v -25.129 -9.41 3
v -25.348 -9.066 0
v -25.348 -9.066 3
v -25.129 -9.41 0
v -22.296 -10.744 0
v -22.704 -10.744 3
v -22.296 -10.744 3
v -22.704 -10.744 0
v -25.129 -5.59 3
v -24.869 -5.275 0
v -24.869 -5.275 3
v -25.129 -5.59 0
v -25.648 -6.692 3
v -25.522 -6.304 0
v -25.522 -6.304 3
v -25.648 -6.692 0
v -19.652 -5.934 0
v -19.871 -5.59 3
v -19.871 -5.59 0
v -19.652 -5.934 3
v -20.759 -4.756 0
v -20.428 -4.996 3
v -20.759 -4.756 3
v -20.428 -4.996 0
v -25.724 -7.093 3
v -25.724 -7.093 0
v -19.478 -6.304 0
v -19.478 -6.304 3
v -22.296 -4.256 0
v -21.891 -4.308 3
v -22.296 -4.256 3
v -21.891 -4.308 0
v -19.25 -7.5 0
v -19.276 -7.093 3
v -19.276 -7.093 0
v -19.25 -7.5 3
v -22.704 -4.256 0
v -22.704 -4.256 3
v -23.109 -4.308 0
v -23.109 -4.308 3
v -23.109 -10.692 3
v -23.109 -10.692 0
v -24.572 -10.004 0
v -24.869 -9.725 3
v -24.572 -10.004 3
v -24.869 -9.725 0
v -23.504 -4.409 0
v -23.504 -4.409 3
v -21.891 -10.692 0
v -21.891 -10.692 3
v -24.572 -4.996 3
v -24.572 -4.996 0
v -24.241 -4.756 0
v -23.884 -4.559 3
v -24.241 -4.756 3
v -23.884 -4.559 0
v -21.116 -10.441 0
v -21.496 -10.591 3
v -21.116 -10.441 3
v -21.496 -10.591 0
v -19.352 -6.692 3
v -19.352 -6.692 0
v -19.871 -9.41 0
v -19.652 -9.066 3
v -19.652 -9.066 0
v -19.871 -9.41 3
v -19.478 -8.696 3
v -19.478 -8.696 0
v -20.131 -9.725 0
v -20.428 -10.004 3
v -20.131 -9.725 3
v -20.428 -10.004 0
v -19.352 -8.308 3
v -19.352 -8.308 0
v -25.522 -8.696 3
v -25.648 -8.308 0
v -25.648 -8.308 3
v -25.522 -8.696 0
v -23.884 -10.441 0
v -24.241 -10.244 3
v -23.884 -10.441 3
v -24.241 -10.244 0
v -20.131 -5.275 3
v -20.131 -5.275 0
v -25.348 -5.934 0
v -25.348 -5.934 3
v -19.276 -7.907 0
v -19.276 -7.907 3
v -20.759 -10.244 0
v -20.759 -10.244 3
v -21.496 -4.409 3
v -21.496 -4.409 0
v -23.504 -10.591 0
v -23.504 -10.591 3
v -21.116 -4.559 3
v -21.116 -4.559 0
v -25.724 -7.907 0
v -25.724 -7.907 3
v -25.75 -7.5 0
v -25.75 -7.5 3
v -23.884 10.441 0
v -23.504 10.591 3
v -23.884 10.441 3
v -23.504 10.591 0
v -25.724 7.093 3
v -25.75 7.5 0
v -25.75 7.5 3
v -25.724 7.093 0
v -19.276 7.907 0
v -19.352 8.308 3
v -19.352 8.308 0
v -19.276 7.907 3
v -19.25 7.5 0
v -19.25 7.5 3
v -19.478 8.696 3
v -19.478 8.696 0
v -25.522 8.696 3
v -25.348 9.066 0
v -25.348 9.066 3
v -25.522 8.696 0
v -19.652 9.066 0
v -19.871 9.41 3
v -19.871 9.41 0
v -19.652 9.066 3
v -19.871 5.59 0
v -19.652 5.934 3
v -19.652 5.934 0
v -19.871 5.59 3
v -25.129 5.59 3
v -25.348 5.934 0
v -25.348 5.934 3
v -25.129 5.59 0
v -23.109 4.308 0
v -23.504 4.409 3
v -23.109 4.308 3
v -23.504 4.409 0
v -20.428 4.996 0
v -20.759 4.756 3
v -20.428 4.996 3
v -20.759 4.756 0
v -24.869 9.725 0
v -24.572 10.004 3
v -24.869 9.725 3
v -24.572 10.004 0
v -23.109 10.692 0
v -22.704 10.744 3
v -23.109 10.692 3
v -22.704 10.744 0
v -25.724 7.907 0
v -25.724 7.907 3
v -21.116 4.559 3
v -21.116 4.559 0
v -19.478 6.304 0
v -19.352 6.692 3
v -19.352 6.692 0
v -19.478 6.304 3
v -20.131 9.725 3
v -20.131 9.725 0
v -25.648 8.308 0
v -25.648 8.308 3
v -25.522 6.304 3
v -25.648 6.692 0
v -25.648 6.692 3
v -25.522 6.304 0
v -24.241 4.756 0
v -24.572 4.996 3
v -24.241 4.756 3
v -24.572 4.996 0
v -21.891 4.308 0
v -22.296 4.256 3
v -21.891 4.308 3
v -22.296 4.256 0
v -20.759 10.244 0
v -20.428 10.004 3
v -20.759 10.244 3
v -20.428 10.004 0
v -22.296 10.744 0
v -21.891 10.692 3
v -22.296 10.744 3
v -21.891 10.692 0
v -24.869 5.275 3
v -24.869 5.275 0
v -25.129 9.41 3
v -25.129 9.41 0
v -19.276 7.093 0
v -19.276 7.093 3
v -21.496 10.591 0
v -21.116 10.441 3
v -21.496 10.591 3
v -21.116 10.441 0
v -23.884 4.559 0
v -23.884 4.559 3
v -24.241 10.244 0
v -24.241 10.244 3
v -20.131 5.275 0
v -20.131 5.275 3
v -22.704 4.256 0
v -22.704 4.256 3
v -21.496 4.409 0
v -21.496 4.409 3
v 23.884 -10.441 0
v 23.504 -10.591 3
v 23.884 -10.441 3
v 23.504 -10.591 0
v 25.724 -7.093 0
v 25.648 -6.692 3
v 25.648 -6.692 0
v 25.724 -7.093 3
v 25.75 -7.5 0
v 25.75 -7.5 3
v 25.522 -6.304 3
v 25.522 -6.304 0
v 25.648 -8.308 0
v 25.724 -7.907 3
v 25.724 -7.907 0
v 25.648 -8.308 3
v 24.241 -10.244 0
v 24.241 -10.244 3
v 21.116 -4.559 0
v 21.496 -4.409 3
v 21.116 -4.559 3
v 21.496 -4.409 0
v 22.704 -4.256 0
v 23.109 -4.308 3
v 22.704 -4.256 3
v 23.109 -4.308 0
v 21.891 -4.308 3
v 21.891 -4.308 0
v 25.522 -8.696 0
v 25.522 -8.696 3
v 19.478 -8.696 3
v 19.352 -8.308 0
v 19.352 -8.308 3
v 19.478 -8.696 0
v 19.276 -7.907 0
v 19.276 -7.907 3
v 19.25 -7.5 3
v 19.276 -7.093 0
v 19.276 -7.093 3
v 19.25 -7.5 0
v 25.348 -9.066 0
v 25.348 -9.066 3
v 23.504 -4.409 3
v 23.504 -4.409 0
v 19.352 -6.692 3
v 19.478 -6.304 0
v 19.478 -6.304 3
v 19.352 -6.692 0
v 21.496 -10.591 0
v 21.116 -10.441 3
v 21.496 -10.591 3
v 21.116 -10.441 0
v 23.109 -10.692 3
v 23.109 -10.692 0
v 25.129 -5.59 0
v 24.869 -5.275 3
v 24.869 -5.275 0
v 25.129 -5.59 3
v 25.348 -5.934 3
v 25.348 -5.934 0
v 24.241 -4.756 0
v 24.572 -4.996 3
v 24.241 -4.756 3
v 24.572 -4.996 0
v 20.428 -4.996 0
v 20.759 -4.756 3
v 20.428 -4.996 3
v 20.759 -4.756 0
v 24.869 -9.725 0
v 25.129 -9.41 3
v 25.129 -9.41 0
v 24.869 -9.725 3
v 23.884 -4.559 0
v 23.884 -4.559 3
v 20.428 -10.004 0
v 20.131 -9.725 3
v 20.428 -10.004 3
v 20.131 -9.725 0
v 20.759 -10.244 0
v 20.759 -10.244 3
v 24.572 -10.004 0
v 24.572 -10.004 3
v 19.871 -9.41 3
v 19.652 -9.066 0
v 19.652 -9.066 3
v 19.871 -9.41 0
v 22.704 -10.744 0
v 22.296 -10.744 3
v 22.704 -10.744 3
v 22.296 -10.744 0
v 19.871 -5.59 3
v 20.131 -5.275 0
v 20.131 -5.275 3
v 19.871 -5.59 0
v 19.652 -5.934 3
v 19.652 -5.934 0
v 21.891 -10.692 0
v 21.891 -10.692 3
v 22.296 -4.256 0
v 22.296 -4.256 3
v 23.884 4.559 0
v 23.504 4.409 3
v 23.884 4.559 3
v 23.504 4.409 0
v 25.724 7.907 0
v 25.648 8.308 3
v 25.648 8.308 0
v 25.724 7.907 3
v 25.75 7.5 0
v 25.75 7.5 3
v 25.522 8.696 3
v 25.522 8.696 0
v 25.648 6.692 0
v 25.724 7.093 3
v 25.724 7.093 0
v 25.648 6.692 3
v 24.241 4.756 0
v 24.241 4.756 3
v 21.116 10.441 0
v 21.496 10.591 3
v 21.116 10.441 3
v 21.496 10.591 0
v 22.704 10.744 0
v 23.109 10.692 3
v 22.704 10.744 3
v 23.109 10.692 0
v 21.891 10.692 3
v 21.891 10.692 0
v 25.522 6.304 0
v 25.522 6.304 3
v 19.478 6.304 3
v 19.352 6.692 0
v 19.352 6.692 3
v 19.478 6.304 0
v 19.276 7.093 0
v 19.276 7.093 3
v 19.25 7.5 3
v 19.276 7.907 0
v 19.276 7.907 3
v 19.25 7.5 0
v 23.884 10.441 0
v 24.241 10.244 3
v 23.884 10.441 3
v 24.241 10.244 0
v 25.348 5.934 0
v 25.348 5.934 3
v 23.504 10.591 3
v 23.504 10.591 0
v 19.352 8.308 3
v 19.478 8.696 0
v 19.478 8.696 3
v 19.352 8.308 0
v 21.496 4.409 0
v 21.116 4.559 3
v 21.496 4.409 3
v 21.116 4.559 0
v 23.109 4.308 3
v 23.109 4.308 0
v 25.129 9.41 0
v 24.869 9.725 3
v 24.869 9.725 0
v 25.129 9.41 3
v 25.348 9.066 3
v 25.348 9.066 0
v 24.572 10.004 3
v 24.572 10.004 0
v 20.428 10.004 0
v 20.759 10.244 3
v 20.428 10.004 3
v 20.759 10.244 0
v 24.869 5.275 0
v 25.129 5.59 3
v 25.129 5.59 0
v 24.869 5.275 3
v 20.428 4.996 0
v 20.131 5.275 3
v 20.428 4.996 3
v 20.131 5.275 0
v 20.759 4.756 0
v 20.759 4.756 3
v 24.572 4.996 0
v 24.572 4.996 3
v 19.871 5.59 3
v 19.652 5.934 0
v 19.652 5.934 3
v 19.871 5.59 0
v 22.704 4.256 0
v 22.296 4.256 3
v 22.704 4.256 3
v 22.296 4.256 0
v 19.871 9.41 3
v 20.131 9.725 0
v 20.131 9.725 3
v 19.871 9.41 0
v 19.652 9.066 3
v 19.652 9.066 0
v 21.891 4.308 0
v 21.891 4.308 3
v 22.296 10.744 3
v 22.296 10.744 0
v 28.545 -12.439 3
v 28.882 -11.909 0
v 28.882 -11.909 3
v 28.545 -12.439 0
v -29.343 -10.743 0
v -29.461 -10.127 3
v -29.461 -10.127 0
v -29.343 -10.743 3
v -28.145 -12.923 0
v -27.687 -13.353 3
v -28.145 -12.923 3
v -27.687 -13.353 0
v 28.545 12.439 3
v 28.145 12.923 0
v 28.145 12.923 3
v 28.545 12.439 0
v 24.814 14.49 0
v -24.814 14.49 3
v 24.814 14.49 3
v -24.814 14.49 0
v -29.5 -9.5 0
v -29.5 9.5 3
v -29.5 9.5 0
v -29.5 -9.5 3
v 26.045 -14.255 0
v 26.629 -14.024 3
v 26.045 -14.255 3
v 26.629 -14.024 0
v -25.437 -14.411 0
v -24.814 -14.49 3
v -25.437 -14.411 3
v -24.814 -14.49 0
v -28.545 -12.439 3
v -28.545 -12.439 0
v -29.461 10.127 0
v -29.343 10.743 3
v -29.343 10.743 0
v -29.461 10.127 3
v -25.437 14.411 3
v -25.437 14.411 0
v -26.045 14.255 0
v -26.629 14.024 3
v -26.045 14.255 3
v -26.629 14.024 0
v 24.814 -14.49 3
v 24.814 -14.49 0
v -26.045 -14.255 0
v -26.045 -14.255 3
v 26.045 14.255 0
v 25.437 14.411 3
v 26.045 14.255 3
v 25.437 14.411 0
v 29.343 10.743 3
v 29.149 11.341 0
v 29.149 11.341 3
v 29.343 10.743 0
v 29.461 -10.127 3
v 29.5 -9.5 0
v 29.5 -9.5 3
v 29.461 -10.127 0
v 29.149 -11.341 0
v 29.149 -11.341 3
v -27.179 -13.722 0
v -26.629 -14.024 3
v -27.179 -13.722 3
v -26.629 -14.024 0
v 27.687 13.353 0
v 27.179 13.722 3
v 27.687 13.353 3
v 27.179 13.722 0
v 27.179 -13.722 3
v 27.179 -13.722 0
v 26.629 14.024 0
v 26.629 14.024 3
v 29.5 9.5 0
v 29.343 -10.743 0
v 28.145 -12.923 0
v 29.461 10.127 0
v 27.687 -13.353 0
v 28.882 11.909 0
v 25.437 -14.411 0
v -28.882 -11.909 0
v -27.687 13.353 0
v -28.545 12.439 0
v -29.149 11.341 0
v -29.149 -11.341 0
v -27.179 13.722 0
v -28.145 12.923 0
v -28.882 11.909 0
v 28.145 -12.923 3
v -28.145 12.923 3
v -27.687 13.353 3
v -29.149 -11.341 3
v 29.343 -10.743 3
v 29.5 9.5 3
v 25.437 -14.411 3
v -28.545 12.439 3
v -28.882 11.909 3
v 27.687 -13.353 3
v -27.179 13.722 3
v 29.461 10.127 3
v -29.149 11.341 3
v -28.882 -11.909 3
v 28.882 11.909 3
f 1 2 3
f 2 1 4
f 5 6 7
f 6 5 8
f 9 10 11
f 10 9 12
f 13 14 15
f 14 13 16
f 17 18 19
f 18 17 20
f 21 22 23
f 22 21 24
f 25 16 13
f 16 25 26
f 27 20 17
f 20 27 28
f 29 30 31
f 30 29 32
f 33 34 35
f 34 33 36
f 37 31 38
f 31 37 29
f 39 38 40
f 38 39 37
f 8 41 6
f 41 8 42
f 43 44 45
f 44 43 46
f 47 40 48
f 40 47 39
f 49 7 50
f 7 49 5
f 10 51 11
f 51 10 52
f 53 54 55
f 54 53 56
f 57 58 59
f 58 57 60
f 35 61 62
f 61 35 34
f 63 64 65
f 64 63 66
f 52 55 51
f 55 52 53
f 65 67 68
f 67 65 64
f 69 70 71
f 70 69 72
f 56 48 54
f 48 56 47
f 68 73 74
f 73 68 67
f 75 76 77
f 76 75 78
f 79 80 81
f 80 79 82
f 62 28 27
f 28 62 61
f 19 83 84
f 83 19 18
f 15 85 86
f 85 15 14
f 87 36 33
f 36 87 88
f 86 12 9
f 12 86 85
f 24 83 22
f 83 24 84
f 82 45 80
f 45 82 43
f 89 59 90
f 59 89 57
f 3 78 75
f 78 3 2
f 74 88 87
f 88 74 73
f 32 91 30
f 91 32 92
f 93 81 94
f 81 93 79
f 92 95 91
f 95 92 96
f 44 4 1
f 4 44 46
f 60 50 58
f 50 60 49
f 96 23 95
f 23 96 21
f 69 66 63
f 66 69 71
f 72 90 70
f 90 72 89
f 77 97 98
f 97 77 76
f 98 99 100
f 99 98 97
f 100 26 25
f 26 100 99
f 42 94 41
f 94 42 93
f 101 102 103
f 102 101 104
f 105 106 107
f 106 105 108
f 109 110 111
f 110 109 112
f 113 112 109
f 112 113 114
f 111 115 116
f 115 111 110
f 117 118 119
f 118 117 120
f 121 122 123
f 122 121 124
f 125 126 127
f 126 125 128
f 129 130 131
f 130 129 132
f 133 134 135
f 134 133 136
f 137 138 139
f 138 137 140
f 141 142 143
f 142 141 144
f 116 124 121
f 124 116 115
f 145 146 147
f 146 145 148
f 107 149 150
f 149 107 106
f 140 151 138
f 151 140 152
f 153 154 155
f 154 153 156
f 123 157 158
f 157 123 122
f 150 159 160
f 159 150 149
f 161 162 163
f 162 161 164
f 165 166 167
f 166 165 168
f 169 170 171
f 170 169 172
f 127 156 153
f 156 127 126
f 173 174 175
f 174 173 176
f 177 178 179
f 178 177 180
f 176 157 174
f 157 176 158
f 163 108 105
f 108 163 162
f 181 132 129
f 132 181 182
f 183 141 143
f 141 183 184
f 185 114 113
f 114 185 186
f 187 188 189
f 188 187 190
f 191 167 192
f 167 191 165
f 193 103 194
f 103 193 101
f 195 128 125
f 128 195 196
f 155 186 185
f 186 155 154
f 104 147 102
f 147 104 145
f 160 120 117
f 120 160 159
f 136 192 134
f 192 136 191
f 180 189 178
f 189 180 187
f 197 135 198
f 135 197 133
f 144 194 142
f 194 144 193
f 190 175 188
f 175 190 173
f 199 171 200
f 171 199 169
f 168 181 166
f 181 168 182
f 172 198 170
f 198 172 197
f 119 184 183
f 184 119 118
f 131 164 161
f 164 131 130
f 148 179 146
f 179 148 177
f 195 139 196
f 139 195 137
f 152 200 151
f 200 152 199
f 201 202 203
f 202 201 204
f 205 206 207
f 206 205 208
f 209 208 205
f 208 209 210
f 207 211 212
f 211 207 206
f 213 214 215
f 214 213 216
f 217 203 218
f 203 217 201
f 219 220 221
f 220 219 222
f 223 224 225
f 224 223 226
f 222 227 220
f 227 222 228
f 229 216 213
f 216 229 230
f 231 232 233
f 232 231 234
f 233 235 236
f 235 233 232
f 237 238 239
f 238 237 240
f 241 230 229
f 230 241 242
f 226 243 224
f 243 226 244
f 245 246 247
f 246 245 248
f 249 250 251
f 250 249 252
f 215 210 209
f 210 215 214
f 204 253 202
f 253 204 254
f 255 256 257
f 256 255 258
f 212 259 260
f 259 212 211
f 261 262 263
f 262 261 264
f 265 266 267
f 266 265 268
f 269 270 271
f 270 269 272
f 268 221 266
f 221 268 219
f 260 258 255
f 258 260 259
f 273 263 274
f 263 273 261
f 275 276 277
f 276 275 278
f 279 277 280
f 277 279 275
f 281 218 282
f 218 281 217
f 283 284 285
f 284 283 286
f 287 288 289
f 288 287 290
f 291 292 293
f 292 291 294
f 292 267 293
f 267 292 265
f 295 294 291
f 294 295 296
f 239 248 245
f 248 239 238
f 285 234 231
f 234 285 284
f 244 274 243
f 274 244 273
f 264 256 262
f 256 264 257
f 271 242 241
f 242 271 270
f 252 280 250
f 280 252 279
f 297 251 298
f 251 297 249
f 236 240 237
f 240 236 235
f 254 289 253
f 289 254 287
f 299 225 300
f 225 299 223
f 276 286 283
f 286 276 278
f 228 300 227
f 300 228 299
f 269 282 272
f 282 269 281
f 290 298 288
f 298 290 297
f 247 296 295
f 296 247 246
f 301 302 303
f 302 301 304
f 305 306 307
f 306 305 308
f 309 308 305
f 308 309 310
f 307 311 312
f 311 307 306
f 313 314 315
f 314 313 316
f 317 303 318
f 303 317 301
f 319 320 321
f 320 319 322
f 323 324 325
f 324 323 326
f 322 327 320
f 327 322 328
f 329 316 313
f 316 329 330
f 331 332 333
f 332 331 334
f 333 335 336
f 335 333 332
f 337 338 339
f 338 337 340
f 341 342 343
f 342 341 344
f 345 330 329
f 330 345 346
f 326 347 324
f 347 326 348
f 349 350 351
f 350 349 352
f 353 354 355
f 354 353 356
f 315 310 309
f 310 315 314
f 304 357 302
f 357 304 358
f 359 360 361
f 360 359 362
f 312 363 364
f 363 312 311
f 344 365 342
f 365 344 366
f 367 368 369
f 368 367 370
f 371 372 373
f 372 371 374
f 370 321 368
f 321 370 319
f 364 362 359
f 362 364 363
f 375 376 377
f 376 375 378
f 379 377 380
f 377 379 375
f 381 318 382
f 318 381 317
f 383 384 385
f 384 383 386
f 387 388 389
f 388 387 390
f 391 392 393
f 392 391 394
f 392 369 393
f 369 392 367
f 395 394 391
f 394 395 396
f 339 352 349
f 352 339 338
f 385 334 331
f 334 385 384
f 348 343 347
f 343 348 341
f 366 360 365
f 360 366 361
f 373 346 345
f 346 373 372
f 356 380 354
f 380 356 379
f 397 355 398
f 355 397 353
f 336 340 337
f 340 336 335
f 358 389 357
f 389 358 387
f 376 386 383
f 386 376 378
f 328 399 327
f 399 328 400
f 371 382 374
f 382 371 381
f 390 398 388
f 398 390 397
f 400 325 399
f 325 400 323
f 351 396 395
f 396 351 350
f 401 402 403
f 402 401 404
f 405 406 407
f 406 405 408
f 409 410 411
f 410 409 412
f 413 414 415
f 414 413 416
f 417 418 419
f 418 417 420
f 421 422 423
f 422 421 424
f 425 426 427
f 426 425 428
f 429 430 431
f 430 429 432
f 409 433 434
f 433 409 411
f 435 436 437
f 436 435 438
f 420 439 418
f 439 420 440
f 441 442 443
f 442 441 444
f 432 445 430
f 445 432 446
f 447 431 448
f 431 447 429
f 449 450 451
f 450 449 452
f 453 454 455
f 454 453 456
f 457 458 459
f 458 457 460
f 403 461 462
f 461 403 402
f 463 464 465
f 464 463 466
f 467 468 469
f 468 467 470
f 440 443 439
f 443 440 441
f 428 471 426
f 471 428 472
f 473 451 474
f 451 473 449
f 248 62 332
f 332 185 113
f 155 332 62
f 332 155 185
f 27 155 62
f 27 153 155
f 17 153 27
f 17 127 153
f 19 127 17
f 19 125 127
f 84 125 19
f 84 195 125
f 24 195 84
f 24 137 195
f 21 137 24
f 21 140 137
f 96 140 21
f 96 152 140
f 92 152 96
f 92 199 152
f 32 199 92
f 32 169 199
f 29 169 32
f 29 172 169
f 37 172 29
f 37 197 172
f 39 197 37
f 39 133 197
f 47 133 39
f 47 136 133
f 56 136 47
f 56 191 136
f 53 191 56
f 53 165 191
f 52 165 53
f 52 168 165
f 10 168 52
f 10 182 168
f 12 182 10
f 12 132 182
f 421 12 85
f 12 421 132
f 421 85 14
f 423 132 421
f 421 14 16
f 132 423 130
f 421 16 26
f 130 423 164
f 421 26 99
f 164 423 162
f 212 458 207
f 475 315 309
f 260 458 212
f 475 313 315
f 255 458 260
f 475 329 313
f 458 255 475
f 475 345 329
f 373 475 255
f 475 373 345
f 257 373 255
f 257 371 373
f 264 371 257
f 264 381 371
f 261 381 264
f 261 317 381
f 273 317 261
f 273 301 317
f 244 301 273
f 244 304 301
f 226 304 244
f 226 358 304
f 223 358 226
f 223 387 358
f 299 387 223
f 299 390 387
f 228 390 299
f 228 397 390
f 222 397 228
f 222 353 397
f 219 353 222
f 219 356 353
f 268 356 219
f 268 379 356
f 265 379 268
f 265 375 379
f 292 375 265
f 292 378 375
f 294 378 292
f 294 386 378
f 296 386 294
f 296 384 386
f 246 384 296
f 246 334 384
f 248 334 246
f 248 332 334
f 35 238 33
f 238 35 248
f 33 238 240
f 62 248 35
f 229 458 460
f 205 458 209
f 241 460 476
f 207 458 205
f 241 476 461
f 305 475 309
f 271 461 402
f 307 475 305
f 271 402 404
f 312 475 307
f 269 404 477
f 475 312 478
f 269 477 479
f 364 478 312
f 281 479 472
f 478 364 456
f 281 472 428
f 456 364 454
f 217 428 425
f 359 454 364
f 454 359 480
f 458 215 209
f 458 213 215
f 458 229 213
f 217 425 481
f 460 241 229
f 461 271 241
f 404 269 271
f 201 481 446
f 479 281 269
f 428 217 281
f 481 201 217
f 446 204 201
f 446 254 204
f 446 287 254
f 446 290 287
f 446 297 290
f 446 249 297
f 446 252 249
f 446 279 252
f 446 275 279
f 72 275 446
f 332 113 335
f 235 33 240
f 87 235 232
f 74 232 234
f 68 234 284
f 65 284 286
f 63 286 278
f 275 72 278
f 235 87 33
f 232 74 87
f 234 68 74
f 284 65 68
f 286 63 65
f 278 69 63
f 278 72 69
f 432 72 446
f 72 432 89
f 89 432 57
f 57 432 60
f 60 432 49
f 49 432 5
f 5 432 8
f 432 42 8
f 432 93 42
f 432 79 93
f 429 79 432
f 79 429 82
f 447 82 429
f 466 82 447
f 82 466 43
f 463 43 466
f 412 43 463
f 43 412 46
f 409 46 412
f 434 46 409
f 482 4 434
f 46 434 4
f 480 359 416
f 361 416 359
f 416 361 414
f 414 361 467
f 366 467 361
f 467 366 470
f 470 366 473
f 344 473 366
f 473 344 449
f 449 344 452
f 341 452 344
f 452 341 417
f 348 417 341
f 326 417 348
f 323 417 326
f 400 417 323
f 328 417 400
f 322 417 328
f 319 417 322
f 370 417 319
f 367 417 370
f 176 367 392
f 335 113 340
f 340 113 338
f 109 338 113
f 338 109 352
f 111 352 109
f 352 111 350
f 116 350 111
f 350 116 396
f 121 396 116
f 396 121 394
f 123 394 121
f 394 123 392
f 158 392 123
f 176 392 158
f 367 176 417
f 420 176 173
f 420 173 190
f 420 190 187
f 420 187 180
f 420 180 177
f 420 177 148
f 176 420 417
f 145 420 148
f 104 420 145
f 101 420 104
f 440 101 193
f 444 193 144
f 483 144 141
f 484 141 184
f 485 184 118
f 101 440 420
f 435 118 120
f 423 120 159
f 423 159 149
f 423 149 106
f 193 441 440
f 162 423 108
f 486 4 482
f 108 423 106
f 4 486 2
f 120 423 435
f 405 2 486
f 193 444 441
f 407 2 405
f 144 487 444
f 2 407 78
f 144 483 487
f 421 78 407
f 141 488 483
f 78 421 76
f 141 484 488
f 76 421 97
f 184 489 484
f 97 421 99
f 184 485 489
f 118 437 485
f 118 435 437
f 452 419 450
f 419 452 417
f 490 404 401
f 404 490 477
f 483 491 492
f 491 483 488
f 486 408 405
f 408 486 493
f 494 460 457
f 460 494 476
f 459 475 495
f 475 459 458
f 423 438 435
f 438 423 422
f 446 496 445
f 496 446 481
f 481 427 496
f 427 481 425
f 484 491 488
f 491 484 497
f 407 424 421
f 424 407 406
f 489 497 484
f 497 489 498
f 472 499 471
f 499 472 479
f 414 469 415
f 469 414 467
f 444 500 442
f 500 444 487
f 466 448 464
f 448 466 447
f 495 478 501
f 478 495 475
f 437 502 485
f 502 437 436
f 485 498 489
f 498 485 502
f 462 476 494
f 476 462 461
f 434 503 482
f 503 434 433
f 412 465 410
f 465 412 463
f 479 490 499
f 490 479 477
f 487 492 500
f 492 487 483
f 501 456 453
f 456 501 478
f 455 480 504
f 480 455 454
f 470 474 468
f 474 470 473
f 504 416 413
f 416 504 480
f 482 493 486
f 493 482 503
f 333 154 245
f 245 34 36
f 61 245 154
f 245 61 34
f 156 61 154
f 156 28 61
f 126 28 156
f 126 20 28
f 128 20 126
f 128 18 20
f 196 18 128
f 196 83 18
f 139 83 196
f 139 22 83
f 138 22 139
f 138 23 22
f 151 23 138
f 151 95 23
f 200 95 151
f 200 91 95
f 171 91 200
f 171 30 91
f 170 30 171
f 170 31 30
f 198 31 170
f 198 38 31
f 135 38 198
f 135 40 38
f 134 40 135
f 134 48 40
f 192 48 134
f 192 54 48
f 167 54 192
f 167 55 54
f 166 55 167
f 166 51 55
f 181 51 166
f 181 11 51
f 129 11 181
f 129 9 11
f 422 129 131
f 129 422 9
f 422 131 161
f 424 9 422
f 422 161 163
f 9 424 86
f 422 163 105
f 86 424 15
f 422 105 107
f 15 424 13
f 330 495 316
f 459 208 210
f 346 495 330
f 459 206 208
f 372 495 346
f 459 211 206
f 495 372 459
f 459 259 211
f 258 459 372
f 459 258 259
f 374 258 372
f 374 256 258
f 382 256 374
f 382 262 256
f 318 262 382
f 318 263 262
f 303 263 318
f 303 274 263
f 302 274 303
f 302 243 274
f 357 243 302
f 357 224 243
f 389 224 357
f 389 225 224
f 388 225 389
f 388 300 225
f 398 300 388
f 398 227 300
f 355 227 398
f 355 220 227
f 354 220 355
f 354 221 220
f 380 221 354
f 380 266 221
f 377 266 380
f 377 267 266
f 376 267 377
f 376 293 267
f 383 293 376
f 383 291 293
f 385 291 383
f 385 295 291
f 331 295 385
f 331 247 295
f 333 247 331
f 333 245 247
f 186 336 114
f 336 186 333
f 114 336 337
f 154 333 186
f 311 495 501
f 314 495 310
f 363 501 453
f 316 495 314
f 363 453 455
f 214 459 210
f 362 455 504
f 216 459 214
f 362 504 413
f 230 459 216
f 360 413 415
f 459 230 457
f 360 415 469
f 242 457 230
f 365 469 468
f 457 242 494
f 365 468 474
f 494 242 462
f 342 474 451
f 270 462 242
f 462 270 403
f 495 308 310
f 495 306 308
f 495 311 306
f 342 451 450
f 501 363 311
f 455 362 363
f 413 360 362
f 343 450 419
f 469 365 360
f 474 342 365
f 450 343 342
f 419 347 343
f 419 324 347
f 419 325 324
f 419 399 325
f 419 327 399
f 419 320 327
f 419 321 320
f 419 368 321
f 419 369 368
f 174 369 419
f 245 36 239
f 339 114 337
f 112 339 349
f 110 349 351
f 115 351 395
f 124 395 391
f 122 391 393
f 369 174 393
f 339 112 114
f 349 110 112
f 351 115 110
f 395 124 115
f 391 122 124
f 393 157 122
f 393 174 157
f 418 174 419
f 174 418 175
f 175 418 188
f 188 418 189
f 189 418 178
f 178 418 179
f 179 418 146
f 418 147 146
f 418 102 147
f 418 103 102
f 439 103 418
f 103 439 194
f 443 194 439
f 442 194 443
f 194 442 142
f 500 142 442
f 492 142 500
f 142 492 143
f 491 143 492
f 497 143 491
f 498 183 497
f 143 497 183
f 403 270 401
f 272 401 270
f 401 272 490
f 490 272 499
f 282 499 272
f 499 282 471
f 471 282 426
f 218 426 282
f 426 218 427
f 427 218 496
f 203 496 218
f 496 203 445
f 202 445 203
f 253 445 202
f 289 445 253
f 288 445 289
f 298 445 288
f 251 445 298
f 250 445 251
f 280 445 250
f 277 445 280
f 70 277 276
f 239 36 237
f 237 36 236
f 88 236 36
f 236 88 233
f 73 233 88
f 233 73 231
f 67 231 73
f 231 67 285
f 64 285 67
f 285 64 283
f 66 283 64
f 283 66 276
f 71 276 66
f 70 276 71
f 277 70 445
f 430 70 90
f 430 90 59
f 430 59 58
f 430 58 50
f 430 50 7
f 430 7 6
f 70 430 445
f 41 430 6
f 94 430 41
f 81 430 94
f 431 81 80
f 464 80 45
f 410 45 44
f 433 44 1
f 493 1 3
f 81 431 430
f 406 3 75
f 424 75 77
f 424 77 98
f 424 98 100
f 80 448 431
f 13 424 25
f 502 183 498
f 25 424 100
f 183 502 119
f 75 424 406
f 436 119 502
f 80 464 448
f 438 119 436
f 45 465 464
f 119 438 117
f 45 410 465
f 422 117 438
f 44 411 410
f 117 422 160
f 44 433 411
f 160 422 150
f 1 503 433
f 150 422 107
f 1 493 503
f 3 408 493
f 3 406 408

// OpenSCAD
$fn = 50;


difference() {
	union() {
		hull() {
			translate(v = [-24.5000000000, 9.5000000000, 0]) {
				cylinder(h = 3, r = 5);
			}
			translate(v = [24.5000000000, 9.5000000000, 0]) {
				cylinder(h = 3, r = 5);
			}
			translate(v = [-24.5000000000, -9.5000000000, 0]) {
				cylinder(h = 3, r = 5);
			}
			translate(v = [24.5000000000, -9.5000000000, 0]) {
				cylinder(h = 3, r = 5);
			}
		}
	}
	union() {
		translate(v = [-22.5000000000, -7.5000000000, -100.0000000000]) {
			cylinder(h = 200, r = 3.2500000000);
		}
		translate(v = [-22.5000000000, 7.5000000000, -100.0000000000]) {
			cylinder(h = 200, r = 3.2500000000);
		}
		translate(v = [22.5000000000, -7.5000000000, -100.0000000000]) {
			cylinder(h = 200, r = 3.2500000000);
		}
		translate(v = [22.5000000000, 7.5000000000, -100.0000000000]) {
			cylinder(h = 200, r = 3.2500000000);
		}
	}
}
